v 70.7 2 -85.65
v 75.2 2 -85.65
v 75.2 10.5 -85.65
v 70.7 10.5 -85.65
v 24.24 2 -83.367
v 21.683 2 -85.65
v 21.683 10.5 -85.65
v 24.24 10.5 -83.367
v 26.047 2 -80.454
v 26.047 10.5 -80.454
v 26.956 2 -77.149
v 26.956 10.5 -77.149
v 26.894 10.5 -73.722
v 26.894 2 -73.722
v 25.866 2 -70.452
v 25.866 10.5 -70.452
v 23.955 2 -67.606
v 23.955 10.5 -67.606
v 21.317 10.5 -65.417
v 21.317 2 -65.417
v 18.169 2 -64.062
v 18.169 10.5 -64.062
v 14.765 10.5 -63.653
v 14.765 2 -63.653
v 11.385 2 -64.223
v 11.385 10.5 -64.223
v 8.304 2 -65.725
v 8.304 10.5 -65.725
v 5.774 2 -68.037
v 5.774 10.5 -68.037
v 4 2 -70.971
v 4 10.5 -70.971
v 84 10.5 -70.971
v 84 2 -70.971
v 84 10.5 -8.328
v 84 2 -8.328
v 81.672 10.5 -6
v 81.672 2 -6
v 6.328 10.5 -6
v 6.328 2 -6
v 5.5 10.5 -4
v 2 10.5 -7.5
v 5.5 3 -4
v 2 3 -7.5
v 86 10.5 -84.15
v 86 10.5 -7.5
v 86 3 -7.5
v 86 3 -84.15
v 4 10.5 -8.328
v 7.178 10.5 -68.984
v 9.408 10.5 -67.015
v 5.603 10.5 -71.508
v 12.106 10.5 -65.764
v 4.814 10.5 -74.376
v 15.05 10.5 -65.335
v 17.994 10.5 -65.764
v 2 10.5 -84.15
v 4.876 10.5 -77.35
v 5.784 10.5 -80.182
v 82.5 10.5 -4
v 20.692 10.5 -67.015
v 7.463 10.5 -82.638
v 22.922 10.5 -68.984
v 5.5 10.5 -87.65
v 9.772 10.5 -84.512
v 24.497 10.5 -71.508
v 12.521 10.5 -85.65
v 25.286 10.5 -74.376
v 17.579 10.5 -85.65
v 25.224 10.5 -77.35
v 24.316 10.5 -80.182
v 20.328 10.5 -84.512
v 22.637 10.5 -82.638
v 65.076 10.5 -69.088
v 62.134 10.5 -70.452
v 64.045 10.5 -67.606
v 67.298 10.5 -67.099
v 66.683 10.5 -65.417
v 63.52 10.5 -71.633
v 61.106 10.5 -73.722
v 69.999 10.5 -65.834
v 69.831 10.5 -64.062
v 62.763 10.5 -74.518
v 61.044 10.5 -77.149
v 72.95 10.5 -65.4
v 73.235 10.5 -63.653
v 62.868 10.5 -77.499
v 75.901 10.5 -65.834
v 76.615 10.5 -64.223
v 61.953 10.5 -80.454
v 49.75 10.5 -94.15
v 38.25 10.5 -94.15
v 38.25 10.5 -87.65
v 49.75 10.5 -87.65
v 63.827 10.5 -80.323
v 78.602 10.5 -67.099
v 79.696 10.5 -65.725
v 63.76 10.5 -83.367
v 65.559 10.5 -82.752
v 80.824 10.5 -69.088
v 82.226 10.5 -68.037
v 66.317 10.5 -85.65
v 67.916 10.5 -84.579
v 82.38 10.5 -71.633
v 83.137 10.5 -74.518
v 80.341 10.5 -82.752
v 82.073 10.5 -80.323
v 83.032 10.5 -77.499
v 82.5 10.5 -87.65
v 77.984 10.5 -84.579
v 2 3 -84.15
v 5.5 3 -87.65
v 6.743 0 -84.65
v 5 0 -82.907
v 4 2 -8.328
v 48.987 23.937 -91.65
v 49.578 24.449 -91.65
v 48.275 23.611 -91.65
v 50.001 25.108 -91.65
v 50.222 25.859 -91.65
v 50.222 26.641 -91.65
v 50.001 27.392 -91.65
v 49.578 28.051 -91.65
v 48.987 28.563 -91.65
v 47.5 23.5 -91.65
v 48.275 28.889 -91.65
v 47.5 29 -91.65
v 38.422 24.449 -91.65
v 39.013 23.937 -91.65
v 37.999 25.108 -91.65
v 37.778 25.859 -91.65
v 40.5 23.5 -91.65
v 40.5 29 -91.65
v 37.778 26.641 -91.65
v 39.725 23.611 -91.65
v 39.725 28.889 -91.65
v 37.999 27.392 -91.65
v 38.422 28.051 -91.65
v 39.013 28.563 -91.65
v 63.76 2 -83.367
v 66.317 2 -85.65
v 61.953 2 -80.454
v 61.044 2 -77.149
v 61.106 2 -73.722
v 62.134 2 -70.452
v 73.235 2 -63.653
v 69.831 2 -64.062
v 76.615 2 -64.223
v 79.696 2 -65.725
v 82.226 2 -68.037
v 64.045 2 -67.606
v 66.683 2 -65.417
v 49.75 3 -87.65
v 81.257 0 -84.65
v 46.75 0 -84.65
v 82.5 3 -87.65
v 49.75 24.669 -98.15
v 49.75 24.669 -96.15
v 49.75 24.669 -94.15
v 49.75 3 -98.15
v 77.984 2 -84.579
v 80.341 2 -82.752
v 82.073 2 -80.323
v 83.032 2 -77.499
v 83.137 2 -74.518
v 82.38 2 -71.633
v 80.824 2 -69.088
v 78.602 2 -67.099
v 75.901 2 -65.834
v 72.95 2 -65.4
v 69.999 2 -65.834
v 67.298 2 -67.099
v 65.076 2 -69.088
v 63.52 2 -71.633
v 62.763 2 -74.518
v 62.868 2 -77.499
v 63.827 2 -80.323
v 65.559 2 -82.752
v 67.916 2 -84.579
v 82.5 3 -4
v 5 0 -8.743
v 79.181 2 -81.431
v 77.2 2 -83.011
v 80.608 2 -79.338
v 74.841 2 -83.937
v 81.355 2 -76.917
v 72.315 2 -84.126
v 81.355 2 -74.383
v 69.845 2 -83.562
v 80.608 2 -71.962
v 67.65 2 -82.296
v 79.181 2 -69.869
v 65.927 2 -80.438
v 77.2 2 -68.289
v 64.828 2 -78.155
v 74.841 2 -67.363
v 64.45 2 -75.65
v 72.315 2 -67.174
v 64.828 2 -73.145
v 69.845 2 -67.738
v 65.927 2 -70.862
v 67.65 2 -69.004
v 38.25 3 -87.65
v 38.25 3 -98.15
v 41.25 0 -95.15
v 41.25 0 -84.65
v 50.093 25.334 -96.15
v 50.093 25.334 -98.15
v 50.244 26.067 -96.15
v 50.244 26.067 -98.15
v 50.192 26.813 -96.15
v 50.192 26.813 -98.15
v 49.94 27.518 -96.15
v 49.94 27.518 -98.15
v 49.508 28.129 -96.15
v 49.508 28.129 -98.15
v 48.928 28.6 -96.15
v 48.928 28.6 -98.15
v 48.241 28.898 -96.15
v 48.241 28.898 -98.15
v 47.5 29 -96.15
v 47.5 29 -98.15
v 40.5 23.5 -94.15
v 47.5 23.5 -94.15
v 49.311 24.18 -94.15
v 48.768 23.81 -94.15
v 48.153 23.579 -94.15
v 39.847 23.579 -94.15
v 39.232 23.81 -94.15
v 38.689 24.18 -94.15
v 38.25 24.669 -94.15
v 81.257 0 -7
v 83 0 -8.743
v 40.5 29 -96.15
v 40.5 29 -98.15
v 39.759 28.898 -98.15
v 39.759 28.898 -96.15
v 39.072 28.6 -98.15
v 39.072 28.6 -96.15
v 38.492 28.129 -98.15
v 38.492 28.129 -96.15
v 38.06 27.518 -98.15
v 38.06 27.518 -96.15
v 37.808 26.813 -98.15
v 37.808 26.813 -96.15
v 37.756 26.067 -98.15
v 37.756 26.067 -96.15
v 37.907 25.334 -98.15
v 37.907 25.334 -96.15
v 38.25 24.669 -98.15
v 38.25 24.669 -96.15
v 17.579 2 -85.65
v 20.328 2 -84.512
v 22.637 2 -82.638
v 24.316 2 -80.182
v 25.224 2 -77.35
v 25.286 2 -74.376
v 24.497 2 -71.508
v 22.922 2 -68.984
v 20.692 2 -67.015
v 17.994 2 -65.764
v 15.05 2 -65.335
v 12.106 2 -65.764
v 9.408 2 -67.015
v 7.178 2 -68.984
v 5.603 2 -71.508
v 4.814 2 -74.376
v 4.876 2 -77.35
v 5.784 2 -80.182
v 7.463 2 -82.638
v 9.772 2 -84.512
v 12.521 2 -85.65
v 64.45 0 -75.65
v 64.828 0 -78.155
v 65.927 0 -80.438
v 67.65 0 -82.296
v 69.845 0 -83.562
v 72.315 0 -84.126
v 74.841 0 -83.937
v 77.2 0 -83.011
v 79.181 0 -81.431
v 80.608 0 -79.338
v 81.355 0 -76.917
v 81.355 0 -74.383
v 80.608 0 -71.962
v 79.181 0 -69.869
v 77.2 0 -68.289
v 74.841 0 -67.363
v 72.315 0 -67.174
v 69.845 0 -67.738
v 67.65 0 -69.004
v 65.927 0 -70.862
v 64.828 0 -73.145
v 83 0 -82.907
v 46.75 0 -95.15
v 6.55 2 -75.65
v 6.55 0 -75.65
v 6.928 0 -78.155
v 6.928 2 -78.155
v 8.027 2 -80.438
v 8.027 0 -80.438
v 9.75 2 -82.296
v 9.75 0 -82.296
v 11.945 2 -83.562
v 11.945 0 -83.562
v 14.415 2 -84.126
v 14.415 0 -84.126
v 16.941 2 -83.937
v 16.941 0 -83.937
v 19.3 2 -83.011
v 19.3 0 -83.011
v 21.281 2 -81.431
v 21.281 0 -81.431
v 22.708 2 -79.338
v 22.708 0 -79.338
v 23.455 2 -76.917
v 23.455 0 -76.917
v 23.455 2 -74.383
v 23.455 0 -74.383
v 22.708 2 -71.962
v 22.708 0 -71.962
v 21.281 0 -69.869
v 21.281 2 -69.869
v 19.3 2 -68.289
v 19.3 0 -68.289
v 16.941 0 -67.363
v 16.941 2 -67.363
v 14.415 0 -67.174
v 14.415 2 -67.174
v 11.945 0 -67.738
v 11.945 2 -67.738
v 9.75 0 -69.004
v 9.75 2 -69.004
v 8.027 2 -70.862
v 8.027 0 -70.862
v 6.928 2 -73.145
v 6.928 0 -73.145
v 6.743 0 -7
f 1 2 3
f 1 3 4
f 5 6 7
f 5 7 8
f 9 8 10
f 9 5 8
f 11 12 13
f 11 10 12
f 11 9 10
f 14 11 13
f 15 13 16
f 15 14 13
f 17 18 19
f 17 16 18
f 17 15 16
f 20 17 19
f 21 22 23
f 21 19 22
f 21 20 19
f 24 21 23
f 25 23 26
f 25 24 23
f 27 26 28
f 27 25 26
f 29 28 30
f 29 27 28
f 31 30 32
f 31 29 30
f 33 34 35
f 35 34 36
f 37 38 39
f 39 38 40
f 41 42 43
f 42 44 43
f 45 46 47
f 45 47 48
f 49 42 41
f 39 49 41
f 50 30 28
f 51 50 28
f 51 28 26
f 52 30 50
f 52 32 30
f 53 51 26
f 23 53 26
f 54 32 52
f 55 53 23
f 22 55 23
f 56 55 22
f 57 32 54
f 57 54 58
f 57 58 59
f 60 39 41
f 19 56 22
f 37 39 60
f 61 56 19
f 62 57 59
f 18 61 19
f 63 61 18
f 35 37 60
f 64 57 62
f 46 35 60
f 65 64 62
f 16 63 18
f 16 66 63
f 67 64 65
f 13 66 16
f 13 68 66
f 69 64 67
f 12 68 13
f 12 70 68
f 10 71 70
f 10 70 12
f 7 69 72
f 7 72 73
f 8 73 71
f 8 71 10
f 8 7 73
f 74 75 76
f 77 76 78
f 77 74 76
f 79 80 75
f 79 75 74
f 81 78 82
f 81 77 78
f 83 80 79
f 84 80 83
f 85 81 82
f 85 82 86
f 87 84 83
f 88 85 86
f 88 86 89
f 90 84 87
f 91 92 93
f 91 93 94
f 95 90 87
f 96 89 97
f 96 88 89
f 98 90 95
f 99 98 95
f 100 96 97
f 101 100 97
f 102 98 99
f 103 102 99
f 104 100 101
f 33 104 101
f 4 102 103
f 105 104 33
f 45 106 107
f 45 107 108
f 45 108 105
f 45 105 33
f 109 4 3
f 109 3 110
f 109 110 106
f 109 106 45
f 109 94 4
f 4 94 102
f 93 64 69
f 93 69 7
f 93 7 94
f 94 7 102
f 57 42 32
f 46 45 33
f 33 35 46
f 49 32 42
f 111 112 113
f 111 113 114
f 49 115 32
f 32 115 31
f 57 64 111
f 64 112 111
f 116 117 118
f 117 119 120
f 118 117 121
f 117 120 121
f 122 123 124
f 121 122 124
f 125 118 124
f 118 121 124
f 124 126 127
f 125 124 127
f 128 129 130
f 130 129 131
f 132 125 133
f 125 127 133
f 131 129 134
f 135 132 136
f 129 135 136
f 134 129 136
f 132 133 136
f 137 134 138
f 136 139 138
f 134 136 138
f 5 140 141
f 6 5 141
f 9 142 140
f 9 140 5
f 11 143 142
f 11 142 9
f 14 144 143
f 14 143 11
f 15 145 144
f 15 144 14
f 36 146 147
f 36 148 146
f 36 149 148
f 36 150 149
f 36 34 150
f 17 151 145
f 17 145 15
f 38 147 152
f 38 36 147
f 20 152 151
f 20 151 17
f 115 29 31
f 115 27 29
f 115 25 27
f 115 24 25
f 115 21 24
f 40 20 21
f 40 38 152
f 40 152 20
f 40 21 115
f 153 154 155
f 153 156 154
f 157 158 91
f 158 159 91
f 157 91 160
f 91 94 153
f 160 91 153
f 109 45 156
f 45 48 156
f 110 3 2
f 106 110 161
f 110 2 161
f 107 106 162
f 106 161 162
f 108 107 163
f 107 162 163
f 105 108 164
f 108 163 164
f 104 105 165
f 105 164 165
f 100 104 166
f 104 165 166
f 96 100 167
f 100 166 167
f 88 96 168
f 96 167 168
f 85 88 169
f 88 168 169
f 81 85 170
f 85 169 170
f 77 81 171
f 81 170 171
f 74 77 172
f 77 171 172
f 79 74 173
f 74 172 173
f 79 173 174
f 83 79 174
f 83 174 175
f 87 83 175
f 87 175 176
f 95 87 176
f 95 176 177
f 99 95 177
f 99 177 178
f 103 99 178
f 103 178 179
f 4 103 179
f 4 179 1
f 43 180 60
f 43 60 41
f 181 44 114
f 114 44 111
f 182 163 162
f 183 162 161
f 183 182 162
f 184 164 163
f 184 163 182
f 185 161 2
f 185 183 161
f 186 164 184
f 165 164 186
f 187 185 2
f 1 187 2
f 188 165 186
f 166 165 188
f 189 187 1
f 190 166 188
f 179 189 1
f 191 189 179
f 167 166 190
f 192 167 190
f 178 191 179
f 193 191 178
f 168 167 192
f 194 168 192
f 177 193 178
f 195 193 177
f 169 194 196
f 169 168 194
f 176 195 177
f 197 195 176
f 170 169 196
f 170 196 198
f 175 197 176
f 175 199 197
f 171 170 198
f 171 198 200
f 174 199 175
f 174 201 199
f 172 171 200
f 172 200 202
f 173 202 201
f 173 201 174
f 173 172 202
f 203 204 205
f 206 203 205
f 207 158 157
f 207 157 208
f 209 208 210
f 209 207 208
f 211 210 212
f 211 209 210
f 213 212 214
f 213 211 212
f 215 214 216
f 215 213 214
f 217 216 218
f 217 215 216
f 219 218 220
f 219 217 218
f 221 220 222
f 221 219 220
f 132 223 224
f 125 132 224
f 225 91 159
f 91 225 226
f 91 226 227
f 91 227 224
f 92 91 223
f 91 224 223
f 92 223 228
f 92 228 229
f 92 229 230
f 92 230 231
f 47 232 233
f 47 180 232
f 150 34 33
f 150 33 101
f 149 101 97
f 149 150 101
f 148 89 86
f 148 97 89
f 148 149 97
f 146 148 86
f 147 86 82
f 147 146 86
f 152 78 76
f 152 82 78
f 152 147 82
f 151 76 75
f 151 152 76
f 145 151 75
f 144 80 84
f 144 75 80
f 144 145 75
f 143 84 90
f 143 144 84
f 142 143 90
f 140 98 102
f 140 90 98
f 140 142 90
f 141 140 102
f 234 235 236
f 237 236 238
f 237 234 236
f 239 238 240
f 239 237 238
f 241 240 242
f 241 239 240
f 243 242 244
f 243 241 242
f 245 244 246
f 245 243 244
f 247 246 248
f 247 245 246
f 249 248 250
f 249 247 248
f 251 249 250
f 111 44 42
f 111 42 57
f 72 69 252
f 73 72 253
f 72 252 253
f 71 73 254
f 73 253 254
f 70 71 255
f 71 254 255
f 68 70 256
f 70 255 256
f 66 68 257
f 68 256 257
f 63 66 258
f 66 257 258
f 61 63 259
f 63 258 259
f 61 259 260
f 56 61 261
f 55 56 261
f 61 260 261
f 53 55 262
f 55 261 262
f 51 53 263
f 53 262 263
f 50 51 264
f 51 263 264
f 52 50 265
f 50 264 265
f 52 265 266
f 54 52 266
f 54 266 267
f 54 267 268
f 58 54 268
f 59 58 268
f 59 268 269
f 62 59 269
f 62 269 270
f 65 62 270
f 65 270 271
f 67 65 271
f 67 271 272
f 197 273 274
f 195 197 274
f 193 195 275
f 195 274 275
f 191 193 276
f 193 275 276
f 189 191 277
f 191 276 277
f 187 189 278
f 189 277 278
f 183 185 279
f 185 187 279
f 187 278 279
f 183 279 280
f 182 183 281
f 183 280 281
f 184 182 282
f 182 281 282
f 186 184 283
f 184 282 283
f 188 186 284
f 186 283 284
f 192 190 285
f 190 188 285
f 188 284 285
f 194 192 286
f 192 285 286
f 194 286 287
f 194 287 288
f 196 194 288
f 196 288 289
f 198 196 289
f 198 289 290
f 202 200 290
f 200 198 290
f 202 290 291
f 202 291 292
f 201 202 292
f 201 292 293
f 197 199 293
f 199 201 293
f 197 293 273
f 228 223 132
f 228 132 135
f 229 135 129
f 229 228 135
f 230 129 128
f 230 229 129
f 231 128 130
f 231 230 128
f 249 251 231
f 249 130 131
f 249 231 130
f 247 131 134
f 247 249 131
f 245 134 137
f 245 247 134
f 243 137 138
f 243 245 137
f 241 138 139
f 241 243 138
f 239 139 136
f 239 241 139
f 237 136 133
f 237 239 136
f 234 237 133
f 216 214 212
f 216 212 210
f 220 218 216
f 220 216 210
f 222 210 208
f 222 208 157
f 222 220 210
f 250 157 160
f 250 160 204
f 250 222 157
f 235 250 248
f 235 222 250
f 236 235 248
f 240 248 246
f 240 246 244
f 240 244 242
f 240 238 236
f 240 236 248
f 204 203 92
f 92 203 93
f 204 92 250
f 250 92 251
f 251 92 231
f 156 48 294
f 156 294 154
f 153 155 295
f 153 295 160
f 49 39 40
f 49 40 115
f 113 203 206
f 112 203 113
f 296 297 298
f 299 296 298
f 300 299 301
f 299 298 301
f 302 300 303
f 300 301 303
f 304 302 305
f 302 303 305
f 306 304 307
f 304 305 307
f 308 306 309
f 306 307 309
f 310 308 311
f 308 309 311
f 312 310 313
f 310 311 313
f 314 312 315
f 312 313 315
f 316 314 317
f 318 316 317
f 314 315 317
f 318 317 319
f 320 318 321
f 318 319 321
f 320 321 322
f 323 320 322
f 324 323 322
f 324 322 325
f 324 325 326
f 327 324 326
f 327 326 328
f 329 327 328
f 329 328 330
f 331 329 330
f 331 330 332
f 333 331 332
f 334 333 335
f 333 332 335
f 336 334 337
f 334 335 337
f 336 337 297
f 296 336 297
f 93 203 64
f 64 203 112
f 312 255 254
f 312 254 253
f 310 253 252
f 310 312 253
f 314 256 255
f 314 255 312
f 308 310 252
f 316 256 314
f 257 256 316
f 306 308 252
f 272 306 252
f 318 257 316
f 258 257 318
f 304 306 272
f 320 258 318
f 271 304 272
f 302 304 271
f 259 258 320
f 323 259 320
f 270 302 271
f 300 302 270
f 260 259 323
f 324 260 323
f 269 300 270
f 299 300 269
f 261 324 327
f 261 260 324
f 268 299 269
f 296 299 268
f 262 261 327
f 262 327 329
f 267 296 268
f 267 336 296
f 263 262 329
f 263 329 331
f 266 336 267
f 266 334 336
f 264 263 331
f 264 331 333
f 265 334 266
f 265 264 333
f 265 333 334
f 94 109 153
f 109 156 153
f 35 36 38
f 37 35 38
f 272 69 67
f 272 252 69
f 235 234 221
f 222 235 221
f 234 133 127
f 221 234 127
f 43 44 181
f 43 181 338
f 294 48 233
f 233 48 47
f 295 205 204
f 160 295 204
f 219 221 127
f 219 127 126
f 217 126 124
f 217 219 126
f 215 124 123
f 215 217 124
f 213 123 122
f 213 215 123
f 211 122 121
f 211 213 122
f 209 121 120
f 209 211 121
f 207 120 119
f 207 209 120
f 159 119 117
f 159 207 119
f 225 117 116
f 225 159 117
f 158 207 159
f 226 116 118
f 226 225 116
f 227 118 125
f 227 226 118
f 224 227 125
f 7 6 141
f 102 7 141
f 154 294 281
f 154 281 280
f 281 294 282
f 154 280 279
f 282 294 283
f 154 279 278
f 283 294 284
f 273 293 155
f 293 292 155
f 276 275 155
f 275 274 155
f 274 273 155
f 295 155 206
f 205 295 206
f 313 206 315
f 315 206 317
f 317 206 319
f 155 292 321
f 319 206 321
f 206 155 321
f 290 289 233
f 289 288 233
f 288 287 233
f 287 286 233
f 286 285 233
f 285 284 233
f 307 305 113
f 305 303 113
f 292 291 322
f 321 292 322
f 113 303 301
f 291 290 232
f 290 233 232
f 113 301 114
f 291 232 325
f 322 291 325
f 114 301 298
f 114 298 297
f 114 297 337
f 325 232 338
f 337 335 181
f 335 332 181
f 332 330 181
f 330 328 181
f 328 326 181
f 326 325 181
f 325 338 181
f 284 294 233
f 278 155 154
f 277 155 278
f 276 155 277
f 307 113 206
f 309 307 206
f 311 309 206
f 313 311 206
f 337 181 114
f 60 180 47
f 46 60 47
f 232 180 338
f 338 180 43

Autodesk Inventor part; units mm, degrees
ref_plane "YZ Plane" through (0, 0, 0) normal (1, 0, 0) x (0, 1, 0)
ref_plane "XZ Plane" through (0, 0, 0) normal (0, 1, 0) x (-1, 0, 0)
ref_plane "XY Plane" through (0, 0, 0) normal (0, 0, 1) x (1, 0, 0)
sketch "Sketch1" plane through (0, 0, 0) normal (0, 1, 0) x (-1, 0, 0)
  line L0 (0, 0) -> (-88, 0)
  line L1 (-88, 0) -> (-88, -94)
  line L2 (-88, -94) -> (0, -94)
  line L3 (0, -94) -> (0, 0)
  line L4 (0, -94) -> (0, -75.65)
  line L5 (0, -94) -> (-15.05, -94)
  circle A0 centre (-15.05, -75.65) radius 8.5
  line L6 (-44, -88.9444) -> (-44, -54.2543) construction
  circle A1 centre (-72.95, -75.65) radius 8.5
  line L7 (-15.05, -94) -> (-15.05, -77.2221)
  line L8 (-15.05, -77.2221) -> (-15.05, -73.1555)
  dimension "d0" = 88
  dimension "d1" = 94
  dimension "d2" = 18.35
  dimension "d3" = 15.05
  dimension "d4" = 17
  dimension "d48" = 17
extrude "Extrusion1" add sketch "Sketch1" along normal blind 2
sketch "Sketch3" plane through (0, 2, 0) normal (0, 1, 0) x (1, 0, 0)
  circle A0 centre (72.95, 75.65) radius 8.5 construction
  circle A1 centre (15.05, 75.65) radius 8.5 construction
  line L0 (0, 0) -> (4, 0) construction
  line L1 (4, 0) -> (4, 6) construction
  line L2 (4, 6) -> (0, 6) construction
  line L3 (0, 6) -> (0, 0) construction
  line L4 (88, 0) -> (84, 0) construction
  line L5 (84, 0) -> (84, 6) construction
  line L6 (84, 6) -> (88, 6) construction
  line L7 (88, 6) -> (88, 0) construction
  line L8 (4, 6) -> (2, 6) construction
  line L9 (2, 6) -> (2, 4) construction
  line L10 (2, 4) -> (4, 4) construction
  line L11 (4, 4) -> (4, 6) construction
  line L12 (2, 4) -> (6, 4)
  line L13 (6, 4) -> (6, 6)
  line L14 (6, 6) -> (2, 6)
  line L15 (2, 6) -> (2, 4)
  line L16 (2, 4) -> (4, 4)
  line L17 (4, 4) -> (4, 8)
  line L18 (4, 8) -> (2, 8)
  line L19 (2, 8) -> (2, 4)
  line L20 (86, 4) -> (82, 4)
  line L21 (82, 4) -> (82, 4)
  line L22 (82, 4) -> (86, 4)
  line L23 (86, 4) -> (86, 4)
  line L24 (86, 4) -> (84, 4)
  line L25 (84, 4) -> (84, 8)
  line L26 (84, 8) -> (86, 8)
  line L27 (86, 8) -> (86, 4)
  line L28 (44, 4.3599) -> (37, 4.3599) construction
  line L29 (88, -1) -> (0, -1) construction
  line L30 (37, -1) -> (51, -1) construction
  line L31 (51, -1) -> (51, 0) construction
  line L32 (51, 0) -> (37, 0) construction
  line L33 (37, 0) -> (37, -1) construction
  line L34 (37, -1) -> (51, -1)
  line L35 (51, -1) -> (51, 0)
  line L36 (51, 0) -> (37, 0)
  line L37 (37, 0) -> (37, -1)
  line L38 (0, 95) -> (88, 95) projected
  line L39 (37, 95) -> (51, 95)
  line L40 (51, 95) -> (51, 94)
  line L41 (51, 94) -> (37, 94)
  line L42 (37, 94) -> (37, 95)
  circle A2 centre (15.05, 75.65) radius 10.5
  circle A3 centre (15.05, 75.65) radius 12
  line L43 (15.05, 75.65) -> (27.05, 75.65) construction
  line L44 (15.05, 75.65) -> (21.05, 86.0423) construction
  line L45 (15.05, 75.65) -> (9.05, 86.0423) construction
  line L46 (15.05, 75.65) -> (3.05, 75.65) construction
  line L47 (15.05, 75.65) -> (9.05, 65.2577) construction
  line L48 (15.05, 75.65) -> (21.05, 65.2577) construction
  line L49 (9.8, 84.7433) -> (9.05, 86.0423) construction
  line L50 (9.8, 84.7433) -> (9.05, 86.0423)
  line L51 (21.05, 86.0423) -> (20.3, 84.7433)
  line L52 (25.55, 75.65) -> (27.05, 75.65)
  line L53 (21.05, 65.2577) -> (20.3, 66.5567)
  line L54 (9.8, 66.5567) -> (9.05, 65.2577)
  line L55 (4.55, 75.65) -> (3.05, 75.65)
  line L56 (44, 84.7433) -> (44, 74.6259) construction
  circle A4 centre (72.95, 75.65) radius 8.5 construction
  circle A5 centre (72.95, 75.65) radius 10.5
  circle A6 centre (72.95, 75.65) radius 12
  line L57 (72.95, 75.65) -> (60.95, 75.65) construction
  line L58 (72.95, 75.65) -> (66.95, 86.0423) construction
  line L59 (72.95, 75.65) -> (78.95, 86.0423) construction
  line L60 (72.95, 75.65) -> (84.95, 75.65) construction
  line L61 (72.95, 75.65) -> (78.95, 65.2577) construction
  line L62 (72.95, 75.65) -> (66.95, 65.2577) construction
  line L63 (78.2, 84.7433) -> (78.95, 86.0423) construction
  line L64 (78.2, 84.7433) -> (78.95, 86.0423)
  line L65 (66.95, 86.0423) -> (67.7, 84.7433)
  line L66 (62.45, 75.65) -> (60.95, 75.65)
  line L67 (66.95, 65.2577) -> (67.7, 66.5567)
  line L68 (78.2, 66.5567) -> (78.95, 65.2577)
  line L69 (83.45, 75.65) -> (84.95, 75.65)
  line L70 (86, 4) -> (82, 4)
  line L71 (82, 4) -> (82, 6)
  line L72 (82, 6) -> (86, 6)
  line L73 (86, 6) -> (86, 4)
  point P0 (2, 4)
  point P1 (4, 6)
  point P2 (84, 4)
  point P3 (84.95, 75.65)
  point P4 (78.95, 65.2577)
  point P5 (3.05, 75.65)
  point P6 (9.05, 65.2577)
  point P7 (84, 6)
  dimension "d11" = 4
  dimension "d12" = 6
  dimension "d13" = 4
  dimension "d14" = 6
  dimension "d15" = 2
  dimension "d16" = 2
  dimension "d17" = 4
  dimension "d18" = 4
  dimension "d19" = 4
  dimension "d20" = 2
  dimension "d21" = 4
  dimension "d22" = 7
  dimension "d23" = 14
  dimension "d24" = 14
  dimension "d25" = 1
  dimension "d26" = 2
  dimension "d27" = 1.5
  dimension "d30" = 360
extrude "Extrusion3" add sketch "Sketch3" along normal blind 8.5 contours L52 A3 L53 A2 | A2 L50 A3 L51 | L54 A3 L55 A2 | L69 A6 L68 A5 | A5 L65 A6 L64 | L67 A6 L66 A5
sketch "Sketch7" plane through (0, 2, 0) normal (0, 1, 0) x (1, 0, 0)
  line L0 (3.05, 75.65) -> (4.55, 75.65) construction
  arc A0 (4.55, 75.65) -> (9.8, 66.5567) centre (15.05, 75.65) ccw construction
  line L1 (9.8, 66.5567) -> (9.05, 65.2577) construction
  arc A1 (3.05, 75.65) -> (9.05, 65.2577) centre (15.05, 75.65) ccw construction
  arc A2 (78.95, 65.2577) -> (84.95, 75.65) centre (72.95, 75.65) ccw construction
  line L2 (78.95, 65.2577) -> (78.2, 66.5567) construction
  arc A3 (78.2, 66.5567) -> (83.45, 75.65) centre (72.95, 75.65) ccw construction
  line L3 (83.45, 75.65) -> (84.95, 75.65) construction
  arc A4 (78.2, 84.7433) -> (67.7, 84.7433) centre (72.95, 75.65) ccw construction
  line L4 (67.7, 84.7433) -> (66.95, 86.0423) construction
  arc A5 (78.95, 86.0423) -> (66.95, 86.0423) centre (72.95, 75.65) ccw construction
  line L5 (78.95, 86.0423) -> (78.2, 84.7433) construction
  line L6 (21.05, 86.0423) -> (20.3, 84.7433) construction
  arc A6 (20.3, 84.7433) -> (9.8, 84.7433) centre (15.05, 75.65) ccw construction
  line L7 (9.8, 84.7433) -> (9.05, 86.0423) construction
  arc A7 (21.05, 86.0423) -> (9.05, 86.0423) centre (15.05, 75.65) ccw construction
  arc A8 (62.45, 75.65) -> (67.7, 66.5567) centre (72.95, 75.65) ccw construction
  line L8 (67.7, 66.5567) -> (66.95, 65.2577) construction
  arc A9 (60.95, 75.65) -> (66.95, 65.2577) centre (72.95, 75.65) ccw construction
  line L9 (60.95, 75.65) -> (62.45, 75.65) construction
  line L10 (25.55, 75.65) -> (27.05, 75.65) construction
  arc A10 (21.05, 65.2577) -> (27.05, 75.65) centre (15.05, 75.65) ccw construction
  line L11 (21.05, 65.2577) -> (20.3, 66.5567) construction
  arc A11 (20.3, 66.5567) -> (25.55, 75.65) centre (15.05, 75.65) ccw construction
  line L12 (88, 94) -> (0, 94) construction
  line L13 (0, 94) -> (0, 0) construction
  line L14 (0, 0) -> (88, 0) construction
  line L15 (88, 0) -> (88, 94) construction
  circle A12 centre (72.95, 75.65) radius 8.5 construction
  circle A13 centre (15.05, 75.65) radius 8.5 construction
  line L16 (2, 4) -> (86, 4) construction
  line L17 (86, 4) -> (86, 94) construction
  line L18 (86, 94) -> (2, 94) construction
  line L19 (2, 94) -> (2, 4) construction
  line L20 (0, 0) -> (88, 0)
  line L21 (88, 0) -> (88, 94)
  line L22 (88, 94) -> (0, 94)
  line L23 (0, 94) -> (0, 0)
  line L24 (86, 94) -> (2, 94)
  line L25 (2, 94) -> (2, 4)
  line L26 (2, 4) -> (86, 4)
  line L27 (86, 4) -> (86, 94)
  point P0 (2, 94)
extrude "Extrusion7" cut sketch "Sketch7" against normal up to surface (2 mm away) contours L23 L22 L25 L26 L27 L21 L20
sketch "Sketch8" plane through (0, 2, 0) normal (0, 1, 0) x (1, 0, 0)
  circle A0 centre (15.05, 75.65) radius 8.5 projected
  circle A1 centre (72.95, 75.65) radius 8.5 projected
  line L0 (86, 4) -> (86, 94) projected
  line L1 (86, 94) -> (2, 94) projected
  line L2 (2, 94) -> (2, 4) projected
  line L3 (3.05, 75.65) -> (4.55, 75.65) projected
  arc A2 (4.55, 75.65) -> (9.8, 66.5567) centre (15.05, 75.65) ccw projected
  line L4 (9.8, 66.5567) -> (9.05, 65.2577) projected
  arc A3 (3.05, 75.65) -> (9.05, 65.2577) centre (15.05, 75.65) ccw projected
  arc A4 (78.95, 65.2577) -> (84.95, 75.65) centre (72.95, 75.65) ccw projected
  line L5 (78.95, 65.2577) -> (78.2, 66.5567) projected
  arc A5 (78.2, 66.5567) -> (83.45, 75.65) centre (72.95, 75.65) ccw projected
  line L6 (83.45, 75.65) -> (84.95, 75.65) projected
  line L7 (25.55, 75.65) -> (27.05, 75.65) projected
  arc A6 (21.05, 65.2577) -> (27.05, 75.65) centre (15.05, 75.65) ccw projected
  line L8 (21.05, 65.2577) -> (20.3, 66.5567) projected
  arc A7 (20.3, 66.5567) -> (25.55, 75.65) centre (15.05, 75.65) ccw projected
  arc A8 (62.45, 75.65) -> (67.7, 66.5567) centre (72.95, 75.65) ccw projected
  line L9 (67.7, 66.5567) -> (66.95, 65.2577) projected
  arc A9 (60.95, 75.65) -> (66.95, 65.2577) centre (72.95, 75.65) ccw projected
  line L10 (60.95, 75.65) -> (62.45, 75.65) projected
  line L11 (21.05, 86.0423) -> (20.3, 84.7433) projected
  arc A10 (20.3, 84.7433) -> (9.8, 84.7433) centre (15.05, 75.65) ccw projected
  line L12 (9.8, 84.7433) -> (9.05, 86.0423) projected
  arc A11 (21.05, 86.0423) -> (9.05, 86.0423) centre (15.05, 75.65) ccw projected
  arc A12 (78.2, 84.7433) -> (67.7, 84.7433) centre (72.95, 75.65) ccw projected
  line L13 (67.7, 84.7433) -> (66.95, 86.0423) projected
  arc A13 (78.95, 86.0423) -> (66.95, 86.0423) centre (72.95, 75.65) ccw projected
  line L14 (78.95, 86.0423) -> (78.2, 84.7433) projected
  line L15 (86, 4) -> (2, 4) projected
  line L16 (2, 75.65) -> (86, 75.65)
  line L17 (86, 75.65) -> (86, 7.5)
  line L18 (82.5, 4) -> (5.5, 4)
  line L19 (2, 7.5) -> (2, 75.65)
  line L20 (2, 7.5) -> (5.5, 4)
  line L21 (82.5, 4) -> (86, 7.5)
  line L22 (4, 73.65) -> (84, 73.65)
  line L23 (84, 73.65) -> (84, 8.3284)
  line L24 (84, 8.3284) -> (81.6716, 6)
  line L25 (81.6716, 6) -> (6.3284, 6)
  line L26 (6.3284, 6) -> (4, 8.3284)
  line L27 (4, 8.3284) -> (4, 73.65)
  line L28 (2, 4) -> (86, 4) projected
  point P0 (0, 0)
  point P1 (2, 4)
  point P2 (4, 70.9705)
  point P3 (3.05, 75.65)
  point P4 (5.5, 4)
  point P5 (84.95, 75.65)
  point P6 (84, 70.9705)
  dimension "d51" = 3.5
  dimension "d52" = 3.5
  dimension "d53" = 3.5
  dimension "d54" = 3.5
  dimension "d55" = 2
extrude "Extrusion8" add sketch "Sketch8" along normal blind 8.5 contours A3 L27 L26 L25 L24 L23 A4 L16 L0 L21 L15 L20 L2
sketch "Sketch9" plane through (0, 2, 0) normal (0, 1, 0) x (1, 0, 0)
  line L0 (5.5, 4) -> (2, 7.5) projected
  line L1 (2, 7.5) -> (2, 4) projected
  line L2 (2, 4) -> (5.5, 4) projected
  line L3 (86, 4) -> (86, 7.5) projected
  line L4 (86, 7.5) -> (82.5, 4) projected
  line L5 (82.5, 4) -> (86, 4) projected
  line L6 (86, 4) -> (86, 7.5) projected
  line L7 (86, 94) -> (2, 94) projected
  line L8 (5.5, 4) -> (82.5, 4) projected
  line L9 (44, 4) -> (44, 94)
  line L10 (44, 49) -> (73.8977, 49)
  line L11 (5.5, 94) -> (2, 90.5)
  line L12 (2, 90.5) -> (2, 94)
  line L13 (2, 94) -> (5.5, 94)
  line L14 (86, 94) -> (86, 90.5)
  line L15 (86, 90.5) -> (82.5, 94)
  line L16 (82.5, 94) -> (86, 94)
  line L17 (86, 94) -> (86, 90.5)
  line L18 (5.5, 94) -> (82.5, 94)
  point P0 (0, 0)
  point P1 (0, 98)
extrude "Extrusion9" cut sketch "Sketch9" against normal blind 10 contours L2 L1 L0 | L5 L4 L3
sketch "Sketch10" plane through (0, 2, 0) normal (0, 1, 0) x (1, 0, 0)
  circle A0 centre (15.05, 75.65) radius 8.5 construction
  circle A1 centre (72.95, 75.65) radius 8.5 construction
  line L0 (21.05, 86.0423) -> (20.3, 84.7433) construction
  arc A2 (20.3, 84.7433) -> (9.8, 84.7433) centre (15.05, 75.65) ccw construction
  line L1 (9.8, 84.7433) -> (9.05, 86.0423) construction
  arc A3 (21.05, 86.0423) -> (9.05, 86.0423) centre (15.05, 75.65) ccw construction
  arc A4 (78.2, 84.7433) -> (67.7, 84.7433) centre (72.95, 75.65) ccw construction
  line L2 (67.7, 84.7433) -> (66.95, 86.0423) construction
  arc A5 (78.95, 86.0423) -> (66.95, 86.0423) centre (72.95, 75.65) ccw construction
  line L3 (78.95, 86.0423) -> (78.2, 84.7433) construction
  line L4 (25.55, 75.65) -> (27.05, 75.65) construction
  arc A6 (21.05, 65.2577) -> (27.05, 75.65) centre (15.05, 75.65) ccw construction
  line L5 (21.05, 65.2577) -> (20.3, 66.5567) construction
  arc A7 (20.3, 66.5567) -> (25.55, 75.65) centre (15.05, 75.65) ccw construction
  arc A8 (62.45, 75.65) -> (67.7, 66.5567) centre (72.95, 75.65) ccw construction
  line L6 (67.7, 66.5567) -> (66.95, 65.2577) construction
  arc A9 (60.95, 75.65) -> (66.95, 65.2577) centre (72.95, 75.65) ccw construction
  line L7 (60.95, 75.65) -> (62.45, 75.65) construction
  line L8 (83.45, 75.65) -> (86, 75.65) construction
  line L9 (86, 75.65) -> (86, 94) construction
  line L10 (86, 94) -> (2, 94) construction
  line L11 (2, 94) -> (2, 75.65) construction
  line L12 (2, 75.65) -> (4.55, 75.65) construction
  arc A10 (4.55, 75.65) -> (9.8, 66.5567) centre (15.05, 75.65) ccw construction
  line L13 (9.8, 66.5567) -> (9.05, 65.2577) construction
  arc A11 (4, 70.9705) -> (9.05, 65.2577) centre (15.05, 75.65) ccw construction
  line L14 (4, 70.9705) -> (4, 8.3284) construction
  line L15 (4, 8.3284) -> (6.3284, 6) construction
  line L16 (6.3284, 6) -> (81.6716, 6) construction
  line L17 (81.6716, 6) -> (84, 8.3284) construction
  line L18 (84, 8.3284) -> (84, 70.9705) construction
  arc A12 (78.95, 65.2577) -> (84, 70.9705) centre (72.95, 75.65) ccw construction
  line L19 (78.95, 65.2577) -> (78.2, 66.5567) construction
  arc A13 (78.2, 66.5567) -> (83.45, 75.65) centre (72.95, 75.65) ccw construction
  line L20 (15.05, 87.65) -> (72.95, 87.65) construction
  line L21 (72.95, 87.65) -> (82.5, 87.65) construction
  line L22 (86, 75.65) -> (86, 84.15) construction
  line L23 (82.5, 87.65) -> (86, 84.15) construction
  line L24 (15.05, 87.65) -> (5.5, 87.65) construction
  arc A14 (21.05, 86.0423) -> (9.05, 86.0423) centre (15.05, 75.65) ccw construction
  line L25 (2, 75.65) -> (2, 84.15) construction
  line L26 (5.5, 87.65) -> (2, 84.15) construction
  line L27 (4, 75.65) -> (4, 83.3216) construction
  line L28 (4, 83.3216) -> (6.3284, 85.65) construction
  line L29 (6.3284, 85.65) -> (14.65, 85.65) construction
  line L30 (14.65, 85.65) -> (72.95, 85.65) construction
  line L31 (72.95, 85.65) -> (81.6716, 85.65) construction
  line L32 (81.6716, 85.65) -> (84, 83.3216) construction
  line L33 (84, 83.3216) -> (84, 75.65) construction
  line L34 (2, 75.65) -> (4, 75.65)
  line L35 (4, 75.65) -> (4, 83.3216)
  line L36 (6.3284, 85.65) -> (4, 83.3216)
  line L37 (6.3284, 85.65) -> (81.6716, 85.65)
  line L38 (81.6716, 85.65) -> (84, 83.3216)
  line L39 (84, 83.3216) -> (84, 75.65)
  line L40 (84, 75.65) -> (86, 75.65)
  line L41 (86, 7.5) -> (86, 75.65) projected
  line L42 (86, 75.65) -> (86, 84.15)
  line L43 (86, 84.15) -> (82.5, 87.65)
  line L44 (82.5, 87.65) -> (5.5, 87.65)
  line L45 (5.5, 87.65) -> (2, 84.15)
  line L46 (2, 75.65) -> (2, 84.15)
  point P0 (0, 0)
  point P1 (86, 87.65)
  point P2 (2, 87.65)
  dimension "d60" = 3.5
  dimension "d61" = 3.5
  dimension "d62" = 3.5
  dimension "d63" = 3.5
  dimension "d64" = 2
extrude "Extrusion10" add sketch "Sketch10" along normal blind 8.5
sketch "Sketch11" plane through (0, 10.5, 0) normal (0, 1, 0) x (1, 0, 0)
  point P0 (0, 0)
sketch "Sketch12" plane through (0, 2, 0) normal (0, 1, 0) x (1, 0, 0)
  line L0 (82.5, 87.65) -> (86, 84.15) projected
  line L1 (86, 84.15) -> (86, 94) projected
  line L2 (86, 94) -> (2, 94) projected
  line L3 (2, 94) -> (2, 84.15) projected
  line L4 (2, 84.15) -> (5.5, 87.65) projected
  line L5 (5.5, 87.65) -> (82.5, 87.65) projected
  point P0 (0, 0)
extrude "Extrusion11" cut sketch "Sketch12" against normal blind 8.5
sketch "Sketch13" plane through (0, 2, 0) normal (0, 1, 0) x (1, 0, 0)
  arc A0 (62.45, 75.65) -> (67.7, 66.5567) centre (72.95, 75.65) ccw projected
  line L0 (67.7, 66.5567) -> (66.95, 65.2577) projected
  arc A1 (60.95, 75.65) -> (66.95, 65.2577) centre (72.95, 75.65) ccw projected
  line L1 (60.95, 75.65) -> (62.45, 75.65) projected
  line L2 (25.55, 75.65) -> (27.05, 75.65) projected
  arc A2 (21.05, 65.2577) -> (27.05, 75.65) centre (15.05, 75.65) ccw projected
  line L3 (21.05, 65.2577) -> (20.3, 66.5567) projected
  arc A3 (20.3, 66.5567) -> (25.55, 75.65) centre (15.05, 75.65) ccw projected
  circle A4 centre (72.95, 75.65) radius 8.5 projected
  circle A5 centre (15.05, 75.65) radius 8.5 projected
  line L4 (76.1516, 85.65) -> (69.7484, 85.65) projected
  arc A6 (69.7484, 85.65) -> (67.7, 84.7433) centre (72.95, 75.65) ccw projected
  line L5 (67.7, 84.7433) -> (67.1765, 85.65) projected
  line L6 (67.1765, 85.65) -> (20.8235, 85.65) projected
  line L7 (20.8235, 85.65) -> (20.3, 84.7433) projected
  arc A7 (20.3, 84.7433) -> (18.2516, 85.65) centre (15.05, 75.65) ccw projected
  line L8 (18.2516, 85.65) -> (11.8484, 85.65) projected
  arc A8 (11.8484, 85.65) -> (9.8, 84.7433) centre (15.05, 75.65) ccw projected
  line L9 (9.8, 84.7433) -> (9.2765, 85.65) projected
  line L10 (9.2765, 85.65) -> (6.3284, 85.65) projected
  line L11 (6.3284, 85.65) -> (4, 83.3216) projected
  line L12 (4, 83.3216) -> (4, 75.65) projected
  line L13 (4, 75.65) -> (4.55, 75.65) projected
  arc A9 (4.55, 75.65) -> (9.8, 66.5567) centre (15.05, 75.65) ccw projected
  line L14 (9.8, 66.5567) -> (9.05, 65.2577) projected
  arc A10 (4, 70.9705) -> (9.05, 65.2577) centre (15.05, 75.65) ccw projected
  line L15 (4, 70.9705) -> (4, 8.3284) projected
  line L16 (4, 8.3284) -> (6.3284, 6) projected
  line L17 (6.3284, 6) -> (81.6716, 6) projected
  line L18 (81.6716, 6) -> (84, 8.3284) projected
  line L19 (84, 8.3284) -> (84, 70.9705) projected
  arc A11 (78.95, 65.2577) -> (84, 70.9705) centre (72.95, 75.65) ccw projected
  line L20 (78.95, 65.2577) -> (78.2, 66.5567) projected
  arc A12 (78.2, 66.5567) -> (83.45, 75.65) centre (72.95, 75.65) ccw projected
  line L21 (83.45, 75.65) -> (84, 75.65) projected
  line L22 (84, 75.65) -> (84, 83.3216) projected
  line L23 (84, 83.3216) -> (81.6716, 85.65) projected
  line L24 (81.6716, 85.65) -> (78.7235, 85.65) projected
  line L25 (78.7235, 85.65) -> (78.2, 84.7433) projected
  arc A13 (78.2, 84.7433) -> (76.1516, 85.65) centre (72.95, 75.65) ccw projected
  circle A14 centre (15.05, 75.65) radius 10.3149
  circle A15 centre (15.05, 75.65) radius 11.75
  circle A16 centre (72.95, 75.65) radius 10.25
  circle A17 centre (72.95, 75.65) radius 11.75
  point P0 (0, 0)
  point P1 (8.8805, 85.65)
  point P2 (4, 79.645)
  point P3 (4.7351, 75.65)
  point P4 (9.8926, 84.5829)
  point P5 (9.175, 65.4742)
  point P6 (20.925, 65.4742)
  point P7 (20.2074, 66.7171)
  point P8 (9.8926, 66.7171)
  point P9 (26.8, 75.65)
  point P10 (21.2195, 85.65)
  point P11 (20.2074, 84.5829)
  point P12 (25.3649, 75.65)
  point P13 (67.075, 65.4742)
  point P14 (78.825, 65.4742)
  point P15 (78.075, 66.7732)
  point P16 (67.825, 66.7732)
  point P17 (83.2, 75.65)
  point P18 (84, 79.645)
  point P19 (79.1195, 85.65)
  point P20 (78.075, 84.5268)
  point P21 (66.7805, 85.65)
  point P22 (61.2, 75.65)
  point P23 (62.7, 75.65)
  point P24 (67.825, 84.5268)
  point P25 (12.5209, 85.65)
  point P26 (17.5791, 85.65)
  point P27 (70.7, 85.65)
  point P28 (75.2, 85.65)
extrude "Extrusion12" add sketch "Sketch13" along normal blind 8.5 contours L1 A17 L6 L5 A6 L4 A16 A13 L25 L24 L22 L21 A12 L20 L0 A0 | A0 L0 A17 L1 | A17 L0 A1 L1 | A17 L24 L25 A13 L4 A16 A6 L5 L6 | L20 A12 L21 L22 A17 | A15 L2 A3 L3 L14 A9 L13 L12 L10 L9 A8 L8 A14 A7 L7 L6 | L6 L7 A7 L8 A14 A8 L9 L10 A15 | L24 L23 L22 A17 | A15 L3 A3 L2 | L2 A2 L3 A15 | A15 L12 L11 L10 | L12 L13 A9 L14 A15 | A16 L4 | L8 A14 picked at (73.2018, 85.724) picked at (15.3336, 85.7433)
sketch "Sketch14" plane through (82.5, 10.5, -87.65) normal (0, 0, -1) x (-1, 0, 0)
  line L0 (0, 0) -> (77, 0) construction
  line L1 (0, 0) -> (0, -10.5) construction
  line L2 (77, -10.5) -> (0, -10.5) construction
  line L3 (77, 0) -> (77, -10.5) construction
  line L4 (44.25, -21) -> (32.75, -21) construction
  line L5 (32.75, -21) -> (32.75, 0) construction
  line L6 (32.75, 0) -> (44.25, 0) construction
  line L7 (44.25, 0) -> (44.25, -21) construction
  line L8 (44.25, -21) -> (32.75, 0) construction
  line L9 (32.75, -21) -> (44.25, 0) construction
  line L10 (44.25, -10.5) -> (32.75, -10.5) construction
  line L11 (32.75, 13.5) -> (32.75, 13.5) construction
  line L12 (32.75, 13.5) -> (44.25, 13.5) construction
  line L13 (44.25, 13.5) -> (44.25, 13.5) construction
  line L14 (42, 15.75) -> (35, 15.75) construction
  line L15 (32.75, 13.5) -> (32.75, 11.25) construction
  line L16 (35, 11.25) -> (42, 11.25) construction
  line L17 (44.25, 11.25) -> (44.25, 13.5) construction
  line L18 (44.25, 15.75) -> (32.75, 11.25) construction
  line L19 (32.75, 15.75) -> (44.25, 11.25) construction
  arc A0 (44.25, 13.5) -> (42, 15.75) centre (42, 13.5) ccw construction
  arc A1 (42, 11.25) -> (44.25, 13.5) centre (42, 13.5) ccw construction
  arc A2 (32.75, 13.5) -> (35, 11.25) centre (35, 13.5) ccw construction
  arc A3 (35, 15.75) -> (32.75, 13.5) centre (35, 13.5) ccw construction
  line L20 (44.25, 0) -> (32.75, 0)
  line L21 (32.75, 0) -> (32.75, -10.5)
  line L22 (32.75, -10.5) -> (44.25, -10.5)
  line L23 (44.25, -10.5) -> (44.25, 0)
  point P0 (82.5, -10.5)
  point P1 (38.5, -10.5)
  point P2 (38.5, 13.5)
  dimension "d71" = 11.5
  dimension "d72" = 24
  dimension "d73" = 4.5
  dimension "d74" = 2.25
extrude "Extrusion13" add sketch "Sketch14" along normal blind 6.5
sketch "Sketch15" plane through (82.5, 10.5, -94.15) normal (0, 0, -1) x (-1, 0, 0)
  line L0 (32.75, -10.5) -> (44.25, -10.5) projected
  line L1 (44.25, -10.5) -> (32.75, -10.5)
  line L2 (32.75, -10.5) -> (32.75, 15.75)
  line L3 (32.75, 15.75) -> (44.25, 15.75)
  line L4 (44.25, 15.75) -> (44.25, -10.5)
  line L5 (42, 18) -> (35, 18)
  line L6 (32.75, 15.75) -> (32.75, 13.5)
  line L7 (32.75, 13.5) -> (44.25, 13.5)
  line L8 (44.25, 13.5) -> (44.25, 15.75)
  line L9 (44.25, 18) -> (32.75, 13.5) construction
  line L10 (32.75, 18) -> (44.25, 13.5) construction
  arc A0 (44.25, 15.75) -> (42, 18) centre (42, 15.75) ccw
  arc A1 (35, 18) -> (32.75, 15.75) centre (35, 15.75) ccw
  point P0 (82.5, -10.5)
  point P1 (38.5, 15.75)
  point P2 (44.25, 15.75)
  dimension "d77" = 11.5
  dimension "d78" = 26.25
  dimension "d79" = 4.5
  dimension "d80" = 2.25
extrude "Extrusion14" add sketch "Sketch15" along normal blind 2
sketch "Sketch16" plane through (82.5, 10.5, -94.15) normal (0, 0, 1) x (1, 0, 0)
  line L0 (-44.25, 0) -> (-32.75, 0) construction
  line L1 (-32.75, 15.75) -> (-32.75, 0) construction
  arc A0 (-32.75, 15.75) -> (-35, 18) centre (-35, 15.75) ccw construction
  line L2 (-42, 18) -> (-35, 18) construction
  arc A1 (-42, 18) -> (-44.25, 15.75) centre (-42, 15.75) ccw construction
  line L3 (-44.25, 0) -> (-44.25, 15.75) construction
  circle A2 centre (-35, 15.75) radius 2.25 construction
  circle A3 centre (-42, 15.75) radius 2.25 construction
  line L4 (-35, 13.5) -> (-42, 13.5) construction
  line L5 (-35, 13.5) -> (-42, 13.5)
  line L6 (-42, 18) -> (-35, 18)
  arc A4 (-32.75, 15.75) -> (-35, 18) centre (-35, 15.75) ccw projected
  arc A5 (-35, 13.5) -> (-35, 18) centre (-35, 15.75) ccw
  arc A6 (-42, 18) -> (-42, 13.5) centre (-42, 15.75) ccw
  point P0 (-82.5, -10.5)
extrude "Extrusion15" add sketch "Sketch16" along normal blind 2.5
chamfer "Chamfer1" distance 3 angle 45 9 edges at (2, 0, -45.825) (3.75, 0, -85.9) (21.875, 0, -87.65) (66.125, 0, -87.65) (84.25, 0, -85.9) (86, 0, -45.825) (44, 0, -4) (84.25, 0, -5.75) (3.75, 0, -5.75)
sketch "Sketch17" plane through (82.5, 10.5, -96.15) normal (0, 0, -1) x (-1, 0, 0)
  line L0 (32.75, -10.5) -> (44.25, -10.5) construction
  line L1 (44.25, -10.5) -> (44.25, 15.75) construction
  arc A0 (44.25, 15.75) -> (42, 18) centre (42, 15.75) ccw construction
  line L2 (42, 18) -> (35, 18) construction
  arc A1 (35, 18) -> (32.75, 15.75) centre (35, 15.75) ccw construction
  line L3 (32.75, 15.75) -> (32.75, -10.5) construction
  arc A2 (44.75, 15.75) -> (42, 18.5) centre (42, 15.75) ccw construction
  line L4 (44.75, 15.75) -> (44.75, -11) construction
  line L5 (44.75, -11) -> (32.25, -11) construction
  line L6 (32.25, -11) -> (32.25, 15.75) construction
  arc A3 (35, 18.5) -> (32.25, 15.75) centre (35, 15.75) ccw construction
  line L7 (35, 18.5) -> (42, 18.5) construction
  circle A4 centre (42, 15.75) radius 2.75 construction
  circle A5 centre (35, 15.75) radius 2.75 construction
  line L8 (42, 13) -> (35, 13)
  line L9 (35, 18.5) -> (42, 18.5)
  arc A6 (42, 13) -> (42, 18.5) centre (42, 15.75) ccw
  arc A7 (35, 18.5) -> (35, 13) centre (35, 15.75) ccw
  point P0 (82.5, -10.5)
  dimension "d88" = 0.5
extrude "Extrusion16" add sketch "Sketch17" against normal up to surface (4.5 mm away)
sketch "Sketch18" plane through (82.5, 10.5, -96.15) normal (0, 0, -1) x (-1, 0, 0)
  arc A0 (44.25, 14.1689) -> (42, 18.5) centre (42, 15.75) ccw projected
  line L0 (42, 18.5) -> (35, 18.5) projected
  arc A1 (35, 18.5) -> (32.75, 14.1689) centre (35, 15.75) ccw projected
  line L1 (32.75, 14.1689) -> (32.75, -10.5) projected
  line L2 (32.75, -10.5) -> (44.25, -10.5) projected
  line L3 (44.25, -10.5) -> (44.25, 14.1689) projected
  point P0 (82.5, -10.5)
extrude "Extrusion17" add sketch "Sketch18" along normal blind 2
chamfer "Chamfer2" distance 3 angle 45 4 edges at (38.25, 0, -97.15) (38.25, 0, -90.4) (44, 0, -98.15) (49.75, 0, -90.4)
sketch "Sketch19" plane through (0, 2, 0) normal (0, 1, 0) x (1, 0, 0)
  arc A0 (9.175, 65.4742) -> (20.925, 65.4742) centre (15.05, 75.65) ccw projected
  line L0 (9.175, 65.4742) -> (9.05, 65.2577) projected
  arc A1 (4, 70.9705) -> (9.05, 65.2577) centre (15.05, 75.65) ccw projected
  line L1 (4, 70.9705) -> (4, 8.3284) projected
  line L2 (4, 8.3284) -> (6.3284, 6) projected
  line L3 (6.3284, 6) -> (81.6716, 6) projected
  line L4 (81.6716, 6) -> (84, 8.3284) projected
  line L5 (84, 8.3284) -> (84, 70.9705) projected
  arc A2 (78.95, 65.2577) -> (84, 70.9705) centre (72.95, 75.65) ccw projected
  line L6 (78.95, 65.2577) -> (78.825, 65.4742) projected
  arc A3 (67.075, 65.4742) -> (78.825, 65.4742) centre (72.95, 75.65) ccw projected
  line L7 (67.075, 65.4742) -> (66.95, 65.2577) projected
  arc A4 (60.95, 75.65) -> (66.95, 65.2577) centre (72.95, 75.65) ccw projected
  line L8 (60.95, 75.65) -> (61.2, 75.65) projected
  arc A5 (66.7805, 85.65) -> (61.2, 75.65) centre (72.95, 75.65) ccw projected
  line L9 (66.7805, 85.65) -> (21.2195, 85.65) projected
  arc A6 (26.8, 75.65) -> (21.2195, 85.65) centre (15.05, 75.65) ccw projected
  line L10 (26.8, 75.65) -> (27.05, 75.65) projected
  arc A7 (21.05, 65.2577) -> (27.05, 75.65) centre (15.05, 75.65) ccw projected
  line L11 (21.05, 65.2577) -> (20.925, 65.4742) projected
  arc A8 (21.05, 65.2577) -> (27.05, 75.65) centre (15.05, 75.65) ccw projected
  circle A9 centre (15.05, 75.65) radius 12
  circle A10 centre (72.95, 75.65) radius 12
  circle A11 centre (72.95, 75.65) radius 10.2605
  circle A12 centre (15.05, 75.65) radius 8.5
  line L12 (67.979, 86.572) -> (77.921, 86.572)
  line L13 (20.021, 86.572) -> (10.079, 86.572)
  point P0 (0, 0)
  point P1 (66.3168, 85.65)
  point P2 (21.6832, 85.65)
extrude "Extrusion18" add sketch "Sketch19" along normal blind 8.5 contours A0 L11 A9 L0 | L10 A6 L9 A9 | L9 A5 L8 A10 | L7 A3 L6 A10
equation "\"d52\" = d51"
equation "\"d53\" = d51"
equation "\"d54\" = d53"
equation "\"d61\" = d60"
equation "\"d63\" = d62"
properties part number "case_v1.4_b"
